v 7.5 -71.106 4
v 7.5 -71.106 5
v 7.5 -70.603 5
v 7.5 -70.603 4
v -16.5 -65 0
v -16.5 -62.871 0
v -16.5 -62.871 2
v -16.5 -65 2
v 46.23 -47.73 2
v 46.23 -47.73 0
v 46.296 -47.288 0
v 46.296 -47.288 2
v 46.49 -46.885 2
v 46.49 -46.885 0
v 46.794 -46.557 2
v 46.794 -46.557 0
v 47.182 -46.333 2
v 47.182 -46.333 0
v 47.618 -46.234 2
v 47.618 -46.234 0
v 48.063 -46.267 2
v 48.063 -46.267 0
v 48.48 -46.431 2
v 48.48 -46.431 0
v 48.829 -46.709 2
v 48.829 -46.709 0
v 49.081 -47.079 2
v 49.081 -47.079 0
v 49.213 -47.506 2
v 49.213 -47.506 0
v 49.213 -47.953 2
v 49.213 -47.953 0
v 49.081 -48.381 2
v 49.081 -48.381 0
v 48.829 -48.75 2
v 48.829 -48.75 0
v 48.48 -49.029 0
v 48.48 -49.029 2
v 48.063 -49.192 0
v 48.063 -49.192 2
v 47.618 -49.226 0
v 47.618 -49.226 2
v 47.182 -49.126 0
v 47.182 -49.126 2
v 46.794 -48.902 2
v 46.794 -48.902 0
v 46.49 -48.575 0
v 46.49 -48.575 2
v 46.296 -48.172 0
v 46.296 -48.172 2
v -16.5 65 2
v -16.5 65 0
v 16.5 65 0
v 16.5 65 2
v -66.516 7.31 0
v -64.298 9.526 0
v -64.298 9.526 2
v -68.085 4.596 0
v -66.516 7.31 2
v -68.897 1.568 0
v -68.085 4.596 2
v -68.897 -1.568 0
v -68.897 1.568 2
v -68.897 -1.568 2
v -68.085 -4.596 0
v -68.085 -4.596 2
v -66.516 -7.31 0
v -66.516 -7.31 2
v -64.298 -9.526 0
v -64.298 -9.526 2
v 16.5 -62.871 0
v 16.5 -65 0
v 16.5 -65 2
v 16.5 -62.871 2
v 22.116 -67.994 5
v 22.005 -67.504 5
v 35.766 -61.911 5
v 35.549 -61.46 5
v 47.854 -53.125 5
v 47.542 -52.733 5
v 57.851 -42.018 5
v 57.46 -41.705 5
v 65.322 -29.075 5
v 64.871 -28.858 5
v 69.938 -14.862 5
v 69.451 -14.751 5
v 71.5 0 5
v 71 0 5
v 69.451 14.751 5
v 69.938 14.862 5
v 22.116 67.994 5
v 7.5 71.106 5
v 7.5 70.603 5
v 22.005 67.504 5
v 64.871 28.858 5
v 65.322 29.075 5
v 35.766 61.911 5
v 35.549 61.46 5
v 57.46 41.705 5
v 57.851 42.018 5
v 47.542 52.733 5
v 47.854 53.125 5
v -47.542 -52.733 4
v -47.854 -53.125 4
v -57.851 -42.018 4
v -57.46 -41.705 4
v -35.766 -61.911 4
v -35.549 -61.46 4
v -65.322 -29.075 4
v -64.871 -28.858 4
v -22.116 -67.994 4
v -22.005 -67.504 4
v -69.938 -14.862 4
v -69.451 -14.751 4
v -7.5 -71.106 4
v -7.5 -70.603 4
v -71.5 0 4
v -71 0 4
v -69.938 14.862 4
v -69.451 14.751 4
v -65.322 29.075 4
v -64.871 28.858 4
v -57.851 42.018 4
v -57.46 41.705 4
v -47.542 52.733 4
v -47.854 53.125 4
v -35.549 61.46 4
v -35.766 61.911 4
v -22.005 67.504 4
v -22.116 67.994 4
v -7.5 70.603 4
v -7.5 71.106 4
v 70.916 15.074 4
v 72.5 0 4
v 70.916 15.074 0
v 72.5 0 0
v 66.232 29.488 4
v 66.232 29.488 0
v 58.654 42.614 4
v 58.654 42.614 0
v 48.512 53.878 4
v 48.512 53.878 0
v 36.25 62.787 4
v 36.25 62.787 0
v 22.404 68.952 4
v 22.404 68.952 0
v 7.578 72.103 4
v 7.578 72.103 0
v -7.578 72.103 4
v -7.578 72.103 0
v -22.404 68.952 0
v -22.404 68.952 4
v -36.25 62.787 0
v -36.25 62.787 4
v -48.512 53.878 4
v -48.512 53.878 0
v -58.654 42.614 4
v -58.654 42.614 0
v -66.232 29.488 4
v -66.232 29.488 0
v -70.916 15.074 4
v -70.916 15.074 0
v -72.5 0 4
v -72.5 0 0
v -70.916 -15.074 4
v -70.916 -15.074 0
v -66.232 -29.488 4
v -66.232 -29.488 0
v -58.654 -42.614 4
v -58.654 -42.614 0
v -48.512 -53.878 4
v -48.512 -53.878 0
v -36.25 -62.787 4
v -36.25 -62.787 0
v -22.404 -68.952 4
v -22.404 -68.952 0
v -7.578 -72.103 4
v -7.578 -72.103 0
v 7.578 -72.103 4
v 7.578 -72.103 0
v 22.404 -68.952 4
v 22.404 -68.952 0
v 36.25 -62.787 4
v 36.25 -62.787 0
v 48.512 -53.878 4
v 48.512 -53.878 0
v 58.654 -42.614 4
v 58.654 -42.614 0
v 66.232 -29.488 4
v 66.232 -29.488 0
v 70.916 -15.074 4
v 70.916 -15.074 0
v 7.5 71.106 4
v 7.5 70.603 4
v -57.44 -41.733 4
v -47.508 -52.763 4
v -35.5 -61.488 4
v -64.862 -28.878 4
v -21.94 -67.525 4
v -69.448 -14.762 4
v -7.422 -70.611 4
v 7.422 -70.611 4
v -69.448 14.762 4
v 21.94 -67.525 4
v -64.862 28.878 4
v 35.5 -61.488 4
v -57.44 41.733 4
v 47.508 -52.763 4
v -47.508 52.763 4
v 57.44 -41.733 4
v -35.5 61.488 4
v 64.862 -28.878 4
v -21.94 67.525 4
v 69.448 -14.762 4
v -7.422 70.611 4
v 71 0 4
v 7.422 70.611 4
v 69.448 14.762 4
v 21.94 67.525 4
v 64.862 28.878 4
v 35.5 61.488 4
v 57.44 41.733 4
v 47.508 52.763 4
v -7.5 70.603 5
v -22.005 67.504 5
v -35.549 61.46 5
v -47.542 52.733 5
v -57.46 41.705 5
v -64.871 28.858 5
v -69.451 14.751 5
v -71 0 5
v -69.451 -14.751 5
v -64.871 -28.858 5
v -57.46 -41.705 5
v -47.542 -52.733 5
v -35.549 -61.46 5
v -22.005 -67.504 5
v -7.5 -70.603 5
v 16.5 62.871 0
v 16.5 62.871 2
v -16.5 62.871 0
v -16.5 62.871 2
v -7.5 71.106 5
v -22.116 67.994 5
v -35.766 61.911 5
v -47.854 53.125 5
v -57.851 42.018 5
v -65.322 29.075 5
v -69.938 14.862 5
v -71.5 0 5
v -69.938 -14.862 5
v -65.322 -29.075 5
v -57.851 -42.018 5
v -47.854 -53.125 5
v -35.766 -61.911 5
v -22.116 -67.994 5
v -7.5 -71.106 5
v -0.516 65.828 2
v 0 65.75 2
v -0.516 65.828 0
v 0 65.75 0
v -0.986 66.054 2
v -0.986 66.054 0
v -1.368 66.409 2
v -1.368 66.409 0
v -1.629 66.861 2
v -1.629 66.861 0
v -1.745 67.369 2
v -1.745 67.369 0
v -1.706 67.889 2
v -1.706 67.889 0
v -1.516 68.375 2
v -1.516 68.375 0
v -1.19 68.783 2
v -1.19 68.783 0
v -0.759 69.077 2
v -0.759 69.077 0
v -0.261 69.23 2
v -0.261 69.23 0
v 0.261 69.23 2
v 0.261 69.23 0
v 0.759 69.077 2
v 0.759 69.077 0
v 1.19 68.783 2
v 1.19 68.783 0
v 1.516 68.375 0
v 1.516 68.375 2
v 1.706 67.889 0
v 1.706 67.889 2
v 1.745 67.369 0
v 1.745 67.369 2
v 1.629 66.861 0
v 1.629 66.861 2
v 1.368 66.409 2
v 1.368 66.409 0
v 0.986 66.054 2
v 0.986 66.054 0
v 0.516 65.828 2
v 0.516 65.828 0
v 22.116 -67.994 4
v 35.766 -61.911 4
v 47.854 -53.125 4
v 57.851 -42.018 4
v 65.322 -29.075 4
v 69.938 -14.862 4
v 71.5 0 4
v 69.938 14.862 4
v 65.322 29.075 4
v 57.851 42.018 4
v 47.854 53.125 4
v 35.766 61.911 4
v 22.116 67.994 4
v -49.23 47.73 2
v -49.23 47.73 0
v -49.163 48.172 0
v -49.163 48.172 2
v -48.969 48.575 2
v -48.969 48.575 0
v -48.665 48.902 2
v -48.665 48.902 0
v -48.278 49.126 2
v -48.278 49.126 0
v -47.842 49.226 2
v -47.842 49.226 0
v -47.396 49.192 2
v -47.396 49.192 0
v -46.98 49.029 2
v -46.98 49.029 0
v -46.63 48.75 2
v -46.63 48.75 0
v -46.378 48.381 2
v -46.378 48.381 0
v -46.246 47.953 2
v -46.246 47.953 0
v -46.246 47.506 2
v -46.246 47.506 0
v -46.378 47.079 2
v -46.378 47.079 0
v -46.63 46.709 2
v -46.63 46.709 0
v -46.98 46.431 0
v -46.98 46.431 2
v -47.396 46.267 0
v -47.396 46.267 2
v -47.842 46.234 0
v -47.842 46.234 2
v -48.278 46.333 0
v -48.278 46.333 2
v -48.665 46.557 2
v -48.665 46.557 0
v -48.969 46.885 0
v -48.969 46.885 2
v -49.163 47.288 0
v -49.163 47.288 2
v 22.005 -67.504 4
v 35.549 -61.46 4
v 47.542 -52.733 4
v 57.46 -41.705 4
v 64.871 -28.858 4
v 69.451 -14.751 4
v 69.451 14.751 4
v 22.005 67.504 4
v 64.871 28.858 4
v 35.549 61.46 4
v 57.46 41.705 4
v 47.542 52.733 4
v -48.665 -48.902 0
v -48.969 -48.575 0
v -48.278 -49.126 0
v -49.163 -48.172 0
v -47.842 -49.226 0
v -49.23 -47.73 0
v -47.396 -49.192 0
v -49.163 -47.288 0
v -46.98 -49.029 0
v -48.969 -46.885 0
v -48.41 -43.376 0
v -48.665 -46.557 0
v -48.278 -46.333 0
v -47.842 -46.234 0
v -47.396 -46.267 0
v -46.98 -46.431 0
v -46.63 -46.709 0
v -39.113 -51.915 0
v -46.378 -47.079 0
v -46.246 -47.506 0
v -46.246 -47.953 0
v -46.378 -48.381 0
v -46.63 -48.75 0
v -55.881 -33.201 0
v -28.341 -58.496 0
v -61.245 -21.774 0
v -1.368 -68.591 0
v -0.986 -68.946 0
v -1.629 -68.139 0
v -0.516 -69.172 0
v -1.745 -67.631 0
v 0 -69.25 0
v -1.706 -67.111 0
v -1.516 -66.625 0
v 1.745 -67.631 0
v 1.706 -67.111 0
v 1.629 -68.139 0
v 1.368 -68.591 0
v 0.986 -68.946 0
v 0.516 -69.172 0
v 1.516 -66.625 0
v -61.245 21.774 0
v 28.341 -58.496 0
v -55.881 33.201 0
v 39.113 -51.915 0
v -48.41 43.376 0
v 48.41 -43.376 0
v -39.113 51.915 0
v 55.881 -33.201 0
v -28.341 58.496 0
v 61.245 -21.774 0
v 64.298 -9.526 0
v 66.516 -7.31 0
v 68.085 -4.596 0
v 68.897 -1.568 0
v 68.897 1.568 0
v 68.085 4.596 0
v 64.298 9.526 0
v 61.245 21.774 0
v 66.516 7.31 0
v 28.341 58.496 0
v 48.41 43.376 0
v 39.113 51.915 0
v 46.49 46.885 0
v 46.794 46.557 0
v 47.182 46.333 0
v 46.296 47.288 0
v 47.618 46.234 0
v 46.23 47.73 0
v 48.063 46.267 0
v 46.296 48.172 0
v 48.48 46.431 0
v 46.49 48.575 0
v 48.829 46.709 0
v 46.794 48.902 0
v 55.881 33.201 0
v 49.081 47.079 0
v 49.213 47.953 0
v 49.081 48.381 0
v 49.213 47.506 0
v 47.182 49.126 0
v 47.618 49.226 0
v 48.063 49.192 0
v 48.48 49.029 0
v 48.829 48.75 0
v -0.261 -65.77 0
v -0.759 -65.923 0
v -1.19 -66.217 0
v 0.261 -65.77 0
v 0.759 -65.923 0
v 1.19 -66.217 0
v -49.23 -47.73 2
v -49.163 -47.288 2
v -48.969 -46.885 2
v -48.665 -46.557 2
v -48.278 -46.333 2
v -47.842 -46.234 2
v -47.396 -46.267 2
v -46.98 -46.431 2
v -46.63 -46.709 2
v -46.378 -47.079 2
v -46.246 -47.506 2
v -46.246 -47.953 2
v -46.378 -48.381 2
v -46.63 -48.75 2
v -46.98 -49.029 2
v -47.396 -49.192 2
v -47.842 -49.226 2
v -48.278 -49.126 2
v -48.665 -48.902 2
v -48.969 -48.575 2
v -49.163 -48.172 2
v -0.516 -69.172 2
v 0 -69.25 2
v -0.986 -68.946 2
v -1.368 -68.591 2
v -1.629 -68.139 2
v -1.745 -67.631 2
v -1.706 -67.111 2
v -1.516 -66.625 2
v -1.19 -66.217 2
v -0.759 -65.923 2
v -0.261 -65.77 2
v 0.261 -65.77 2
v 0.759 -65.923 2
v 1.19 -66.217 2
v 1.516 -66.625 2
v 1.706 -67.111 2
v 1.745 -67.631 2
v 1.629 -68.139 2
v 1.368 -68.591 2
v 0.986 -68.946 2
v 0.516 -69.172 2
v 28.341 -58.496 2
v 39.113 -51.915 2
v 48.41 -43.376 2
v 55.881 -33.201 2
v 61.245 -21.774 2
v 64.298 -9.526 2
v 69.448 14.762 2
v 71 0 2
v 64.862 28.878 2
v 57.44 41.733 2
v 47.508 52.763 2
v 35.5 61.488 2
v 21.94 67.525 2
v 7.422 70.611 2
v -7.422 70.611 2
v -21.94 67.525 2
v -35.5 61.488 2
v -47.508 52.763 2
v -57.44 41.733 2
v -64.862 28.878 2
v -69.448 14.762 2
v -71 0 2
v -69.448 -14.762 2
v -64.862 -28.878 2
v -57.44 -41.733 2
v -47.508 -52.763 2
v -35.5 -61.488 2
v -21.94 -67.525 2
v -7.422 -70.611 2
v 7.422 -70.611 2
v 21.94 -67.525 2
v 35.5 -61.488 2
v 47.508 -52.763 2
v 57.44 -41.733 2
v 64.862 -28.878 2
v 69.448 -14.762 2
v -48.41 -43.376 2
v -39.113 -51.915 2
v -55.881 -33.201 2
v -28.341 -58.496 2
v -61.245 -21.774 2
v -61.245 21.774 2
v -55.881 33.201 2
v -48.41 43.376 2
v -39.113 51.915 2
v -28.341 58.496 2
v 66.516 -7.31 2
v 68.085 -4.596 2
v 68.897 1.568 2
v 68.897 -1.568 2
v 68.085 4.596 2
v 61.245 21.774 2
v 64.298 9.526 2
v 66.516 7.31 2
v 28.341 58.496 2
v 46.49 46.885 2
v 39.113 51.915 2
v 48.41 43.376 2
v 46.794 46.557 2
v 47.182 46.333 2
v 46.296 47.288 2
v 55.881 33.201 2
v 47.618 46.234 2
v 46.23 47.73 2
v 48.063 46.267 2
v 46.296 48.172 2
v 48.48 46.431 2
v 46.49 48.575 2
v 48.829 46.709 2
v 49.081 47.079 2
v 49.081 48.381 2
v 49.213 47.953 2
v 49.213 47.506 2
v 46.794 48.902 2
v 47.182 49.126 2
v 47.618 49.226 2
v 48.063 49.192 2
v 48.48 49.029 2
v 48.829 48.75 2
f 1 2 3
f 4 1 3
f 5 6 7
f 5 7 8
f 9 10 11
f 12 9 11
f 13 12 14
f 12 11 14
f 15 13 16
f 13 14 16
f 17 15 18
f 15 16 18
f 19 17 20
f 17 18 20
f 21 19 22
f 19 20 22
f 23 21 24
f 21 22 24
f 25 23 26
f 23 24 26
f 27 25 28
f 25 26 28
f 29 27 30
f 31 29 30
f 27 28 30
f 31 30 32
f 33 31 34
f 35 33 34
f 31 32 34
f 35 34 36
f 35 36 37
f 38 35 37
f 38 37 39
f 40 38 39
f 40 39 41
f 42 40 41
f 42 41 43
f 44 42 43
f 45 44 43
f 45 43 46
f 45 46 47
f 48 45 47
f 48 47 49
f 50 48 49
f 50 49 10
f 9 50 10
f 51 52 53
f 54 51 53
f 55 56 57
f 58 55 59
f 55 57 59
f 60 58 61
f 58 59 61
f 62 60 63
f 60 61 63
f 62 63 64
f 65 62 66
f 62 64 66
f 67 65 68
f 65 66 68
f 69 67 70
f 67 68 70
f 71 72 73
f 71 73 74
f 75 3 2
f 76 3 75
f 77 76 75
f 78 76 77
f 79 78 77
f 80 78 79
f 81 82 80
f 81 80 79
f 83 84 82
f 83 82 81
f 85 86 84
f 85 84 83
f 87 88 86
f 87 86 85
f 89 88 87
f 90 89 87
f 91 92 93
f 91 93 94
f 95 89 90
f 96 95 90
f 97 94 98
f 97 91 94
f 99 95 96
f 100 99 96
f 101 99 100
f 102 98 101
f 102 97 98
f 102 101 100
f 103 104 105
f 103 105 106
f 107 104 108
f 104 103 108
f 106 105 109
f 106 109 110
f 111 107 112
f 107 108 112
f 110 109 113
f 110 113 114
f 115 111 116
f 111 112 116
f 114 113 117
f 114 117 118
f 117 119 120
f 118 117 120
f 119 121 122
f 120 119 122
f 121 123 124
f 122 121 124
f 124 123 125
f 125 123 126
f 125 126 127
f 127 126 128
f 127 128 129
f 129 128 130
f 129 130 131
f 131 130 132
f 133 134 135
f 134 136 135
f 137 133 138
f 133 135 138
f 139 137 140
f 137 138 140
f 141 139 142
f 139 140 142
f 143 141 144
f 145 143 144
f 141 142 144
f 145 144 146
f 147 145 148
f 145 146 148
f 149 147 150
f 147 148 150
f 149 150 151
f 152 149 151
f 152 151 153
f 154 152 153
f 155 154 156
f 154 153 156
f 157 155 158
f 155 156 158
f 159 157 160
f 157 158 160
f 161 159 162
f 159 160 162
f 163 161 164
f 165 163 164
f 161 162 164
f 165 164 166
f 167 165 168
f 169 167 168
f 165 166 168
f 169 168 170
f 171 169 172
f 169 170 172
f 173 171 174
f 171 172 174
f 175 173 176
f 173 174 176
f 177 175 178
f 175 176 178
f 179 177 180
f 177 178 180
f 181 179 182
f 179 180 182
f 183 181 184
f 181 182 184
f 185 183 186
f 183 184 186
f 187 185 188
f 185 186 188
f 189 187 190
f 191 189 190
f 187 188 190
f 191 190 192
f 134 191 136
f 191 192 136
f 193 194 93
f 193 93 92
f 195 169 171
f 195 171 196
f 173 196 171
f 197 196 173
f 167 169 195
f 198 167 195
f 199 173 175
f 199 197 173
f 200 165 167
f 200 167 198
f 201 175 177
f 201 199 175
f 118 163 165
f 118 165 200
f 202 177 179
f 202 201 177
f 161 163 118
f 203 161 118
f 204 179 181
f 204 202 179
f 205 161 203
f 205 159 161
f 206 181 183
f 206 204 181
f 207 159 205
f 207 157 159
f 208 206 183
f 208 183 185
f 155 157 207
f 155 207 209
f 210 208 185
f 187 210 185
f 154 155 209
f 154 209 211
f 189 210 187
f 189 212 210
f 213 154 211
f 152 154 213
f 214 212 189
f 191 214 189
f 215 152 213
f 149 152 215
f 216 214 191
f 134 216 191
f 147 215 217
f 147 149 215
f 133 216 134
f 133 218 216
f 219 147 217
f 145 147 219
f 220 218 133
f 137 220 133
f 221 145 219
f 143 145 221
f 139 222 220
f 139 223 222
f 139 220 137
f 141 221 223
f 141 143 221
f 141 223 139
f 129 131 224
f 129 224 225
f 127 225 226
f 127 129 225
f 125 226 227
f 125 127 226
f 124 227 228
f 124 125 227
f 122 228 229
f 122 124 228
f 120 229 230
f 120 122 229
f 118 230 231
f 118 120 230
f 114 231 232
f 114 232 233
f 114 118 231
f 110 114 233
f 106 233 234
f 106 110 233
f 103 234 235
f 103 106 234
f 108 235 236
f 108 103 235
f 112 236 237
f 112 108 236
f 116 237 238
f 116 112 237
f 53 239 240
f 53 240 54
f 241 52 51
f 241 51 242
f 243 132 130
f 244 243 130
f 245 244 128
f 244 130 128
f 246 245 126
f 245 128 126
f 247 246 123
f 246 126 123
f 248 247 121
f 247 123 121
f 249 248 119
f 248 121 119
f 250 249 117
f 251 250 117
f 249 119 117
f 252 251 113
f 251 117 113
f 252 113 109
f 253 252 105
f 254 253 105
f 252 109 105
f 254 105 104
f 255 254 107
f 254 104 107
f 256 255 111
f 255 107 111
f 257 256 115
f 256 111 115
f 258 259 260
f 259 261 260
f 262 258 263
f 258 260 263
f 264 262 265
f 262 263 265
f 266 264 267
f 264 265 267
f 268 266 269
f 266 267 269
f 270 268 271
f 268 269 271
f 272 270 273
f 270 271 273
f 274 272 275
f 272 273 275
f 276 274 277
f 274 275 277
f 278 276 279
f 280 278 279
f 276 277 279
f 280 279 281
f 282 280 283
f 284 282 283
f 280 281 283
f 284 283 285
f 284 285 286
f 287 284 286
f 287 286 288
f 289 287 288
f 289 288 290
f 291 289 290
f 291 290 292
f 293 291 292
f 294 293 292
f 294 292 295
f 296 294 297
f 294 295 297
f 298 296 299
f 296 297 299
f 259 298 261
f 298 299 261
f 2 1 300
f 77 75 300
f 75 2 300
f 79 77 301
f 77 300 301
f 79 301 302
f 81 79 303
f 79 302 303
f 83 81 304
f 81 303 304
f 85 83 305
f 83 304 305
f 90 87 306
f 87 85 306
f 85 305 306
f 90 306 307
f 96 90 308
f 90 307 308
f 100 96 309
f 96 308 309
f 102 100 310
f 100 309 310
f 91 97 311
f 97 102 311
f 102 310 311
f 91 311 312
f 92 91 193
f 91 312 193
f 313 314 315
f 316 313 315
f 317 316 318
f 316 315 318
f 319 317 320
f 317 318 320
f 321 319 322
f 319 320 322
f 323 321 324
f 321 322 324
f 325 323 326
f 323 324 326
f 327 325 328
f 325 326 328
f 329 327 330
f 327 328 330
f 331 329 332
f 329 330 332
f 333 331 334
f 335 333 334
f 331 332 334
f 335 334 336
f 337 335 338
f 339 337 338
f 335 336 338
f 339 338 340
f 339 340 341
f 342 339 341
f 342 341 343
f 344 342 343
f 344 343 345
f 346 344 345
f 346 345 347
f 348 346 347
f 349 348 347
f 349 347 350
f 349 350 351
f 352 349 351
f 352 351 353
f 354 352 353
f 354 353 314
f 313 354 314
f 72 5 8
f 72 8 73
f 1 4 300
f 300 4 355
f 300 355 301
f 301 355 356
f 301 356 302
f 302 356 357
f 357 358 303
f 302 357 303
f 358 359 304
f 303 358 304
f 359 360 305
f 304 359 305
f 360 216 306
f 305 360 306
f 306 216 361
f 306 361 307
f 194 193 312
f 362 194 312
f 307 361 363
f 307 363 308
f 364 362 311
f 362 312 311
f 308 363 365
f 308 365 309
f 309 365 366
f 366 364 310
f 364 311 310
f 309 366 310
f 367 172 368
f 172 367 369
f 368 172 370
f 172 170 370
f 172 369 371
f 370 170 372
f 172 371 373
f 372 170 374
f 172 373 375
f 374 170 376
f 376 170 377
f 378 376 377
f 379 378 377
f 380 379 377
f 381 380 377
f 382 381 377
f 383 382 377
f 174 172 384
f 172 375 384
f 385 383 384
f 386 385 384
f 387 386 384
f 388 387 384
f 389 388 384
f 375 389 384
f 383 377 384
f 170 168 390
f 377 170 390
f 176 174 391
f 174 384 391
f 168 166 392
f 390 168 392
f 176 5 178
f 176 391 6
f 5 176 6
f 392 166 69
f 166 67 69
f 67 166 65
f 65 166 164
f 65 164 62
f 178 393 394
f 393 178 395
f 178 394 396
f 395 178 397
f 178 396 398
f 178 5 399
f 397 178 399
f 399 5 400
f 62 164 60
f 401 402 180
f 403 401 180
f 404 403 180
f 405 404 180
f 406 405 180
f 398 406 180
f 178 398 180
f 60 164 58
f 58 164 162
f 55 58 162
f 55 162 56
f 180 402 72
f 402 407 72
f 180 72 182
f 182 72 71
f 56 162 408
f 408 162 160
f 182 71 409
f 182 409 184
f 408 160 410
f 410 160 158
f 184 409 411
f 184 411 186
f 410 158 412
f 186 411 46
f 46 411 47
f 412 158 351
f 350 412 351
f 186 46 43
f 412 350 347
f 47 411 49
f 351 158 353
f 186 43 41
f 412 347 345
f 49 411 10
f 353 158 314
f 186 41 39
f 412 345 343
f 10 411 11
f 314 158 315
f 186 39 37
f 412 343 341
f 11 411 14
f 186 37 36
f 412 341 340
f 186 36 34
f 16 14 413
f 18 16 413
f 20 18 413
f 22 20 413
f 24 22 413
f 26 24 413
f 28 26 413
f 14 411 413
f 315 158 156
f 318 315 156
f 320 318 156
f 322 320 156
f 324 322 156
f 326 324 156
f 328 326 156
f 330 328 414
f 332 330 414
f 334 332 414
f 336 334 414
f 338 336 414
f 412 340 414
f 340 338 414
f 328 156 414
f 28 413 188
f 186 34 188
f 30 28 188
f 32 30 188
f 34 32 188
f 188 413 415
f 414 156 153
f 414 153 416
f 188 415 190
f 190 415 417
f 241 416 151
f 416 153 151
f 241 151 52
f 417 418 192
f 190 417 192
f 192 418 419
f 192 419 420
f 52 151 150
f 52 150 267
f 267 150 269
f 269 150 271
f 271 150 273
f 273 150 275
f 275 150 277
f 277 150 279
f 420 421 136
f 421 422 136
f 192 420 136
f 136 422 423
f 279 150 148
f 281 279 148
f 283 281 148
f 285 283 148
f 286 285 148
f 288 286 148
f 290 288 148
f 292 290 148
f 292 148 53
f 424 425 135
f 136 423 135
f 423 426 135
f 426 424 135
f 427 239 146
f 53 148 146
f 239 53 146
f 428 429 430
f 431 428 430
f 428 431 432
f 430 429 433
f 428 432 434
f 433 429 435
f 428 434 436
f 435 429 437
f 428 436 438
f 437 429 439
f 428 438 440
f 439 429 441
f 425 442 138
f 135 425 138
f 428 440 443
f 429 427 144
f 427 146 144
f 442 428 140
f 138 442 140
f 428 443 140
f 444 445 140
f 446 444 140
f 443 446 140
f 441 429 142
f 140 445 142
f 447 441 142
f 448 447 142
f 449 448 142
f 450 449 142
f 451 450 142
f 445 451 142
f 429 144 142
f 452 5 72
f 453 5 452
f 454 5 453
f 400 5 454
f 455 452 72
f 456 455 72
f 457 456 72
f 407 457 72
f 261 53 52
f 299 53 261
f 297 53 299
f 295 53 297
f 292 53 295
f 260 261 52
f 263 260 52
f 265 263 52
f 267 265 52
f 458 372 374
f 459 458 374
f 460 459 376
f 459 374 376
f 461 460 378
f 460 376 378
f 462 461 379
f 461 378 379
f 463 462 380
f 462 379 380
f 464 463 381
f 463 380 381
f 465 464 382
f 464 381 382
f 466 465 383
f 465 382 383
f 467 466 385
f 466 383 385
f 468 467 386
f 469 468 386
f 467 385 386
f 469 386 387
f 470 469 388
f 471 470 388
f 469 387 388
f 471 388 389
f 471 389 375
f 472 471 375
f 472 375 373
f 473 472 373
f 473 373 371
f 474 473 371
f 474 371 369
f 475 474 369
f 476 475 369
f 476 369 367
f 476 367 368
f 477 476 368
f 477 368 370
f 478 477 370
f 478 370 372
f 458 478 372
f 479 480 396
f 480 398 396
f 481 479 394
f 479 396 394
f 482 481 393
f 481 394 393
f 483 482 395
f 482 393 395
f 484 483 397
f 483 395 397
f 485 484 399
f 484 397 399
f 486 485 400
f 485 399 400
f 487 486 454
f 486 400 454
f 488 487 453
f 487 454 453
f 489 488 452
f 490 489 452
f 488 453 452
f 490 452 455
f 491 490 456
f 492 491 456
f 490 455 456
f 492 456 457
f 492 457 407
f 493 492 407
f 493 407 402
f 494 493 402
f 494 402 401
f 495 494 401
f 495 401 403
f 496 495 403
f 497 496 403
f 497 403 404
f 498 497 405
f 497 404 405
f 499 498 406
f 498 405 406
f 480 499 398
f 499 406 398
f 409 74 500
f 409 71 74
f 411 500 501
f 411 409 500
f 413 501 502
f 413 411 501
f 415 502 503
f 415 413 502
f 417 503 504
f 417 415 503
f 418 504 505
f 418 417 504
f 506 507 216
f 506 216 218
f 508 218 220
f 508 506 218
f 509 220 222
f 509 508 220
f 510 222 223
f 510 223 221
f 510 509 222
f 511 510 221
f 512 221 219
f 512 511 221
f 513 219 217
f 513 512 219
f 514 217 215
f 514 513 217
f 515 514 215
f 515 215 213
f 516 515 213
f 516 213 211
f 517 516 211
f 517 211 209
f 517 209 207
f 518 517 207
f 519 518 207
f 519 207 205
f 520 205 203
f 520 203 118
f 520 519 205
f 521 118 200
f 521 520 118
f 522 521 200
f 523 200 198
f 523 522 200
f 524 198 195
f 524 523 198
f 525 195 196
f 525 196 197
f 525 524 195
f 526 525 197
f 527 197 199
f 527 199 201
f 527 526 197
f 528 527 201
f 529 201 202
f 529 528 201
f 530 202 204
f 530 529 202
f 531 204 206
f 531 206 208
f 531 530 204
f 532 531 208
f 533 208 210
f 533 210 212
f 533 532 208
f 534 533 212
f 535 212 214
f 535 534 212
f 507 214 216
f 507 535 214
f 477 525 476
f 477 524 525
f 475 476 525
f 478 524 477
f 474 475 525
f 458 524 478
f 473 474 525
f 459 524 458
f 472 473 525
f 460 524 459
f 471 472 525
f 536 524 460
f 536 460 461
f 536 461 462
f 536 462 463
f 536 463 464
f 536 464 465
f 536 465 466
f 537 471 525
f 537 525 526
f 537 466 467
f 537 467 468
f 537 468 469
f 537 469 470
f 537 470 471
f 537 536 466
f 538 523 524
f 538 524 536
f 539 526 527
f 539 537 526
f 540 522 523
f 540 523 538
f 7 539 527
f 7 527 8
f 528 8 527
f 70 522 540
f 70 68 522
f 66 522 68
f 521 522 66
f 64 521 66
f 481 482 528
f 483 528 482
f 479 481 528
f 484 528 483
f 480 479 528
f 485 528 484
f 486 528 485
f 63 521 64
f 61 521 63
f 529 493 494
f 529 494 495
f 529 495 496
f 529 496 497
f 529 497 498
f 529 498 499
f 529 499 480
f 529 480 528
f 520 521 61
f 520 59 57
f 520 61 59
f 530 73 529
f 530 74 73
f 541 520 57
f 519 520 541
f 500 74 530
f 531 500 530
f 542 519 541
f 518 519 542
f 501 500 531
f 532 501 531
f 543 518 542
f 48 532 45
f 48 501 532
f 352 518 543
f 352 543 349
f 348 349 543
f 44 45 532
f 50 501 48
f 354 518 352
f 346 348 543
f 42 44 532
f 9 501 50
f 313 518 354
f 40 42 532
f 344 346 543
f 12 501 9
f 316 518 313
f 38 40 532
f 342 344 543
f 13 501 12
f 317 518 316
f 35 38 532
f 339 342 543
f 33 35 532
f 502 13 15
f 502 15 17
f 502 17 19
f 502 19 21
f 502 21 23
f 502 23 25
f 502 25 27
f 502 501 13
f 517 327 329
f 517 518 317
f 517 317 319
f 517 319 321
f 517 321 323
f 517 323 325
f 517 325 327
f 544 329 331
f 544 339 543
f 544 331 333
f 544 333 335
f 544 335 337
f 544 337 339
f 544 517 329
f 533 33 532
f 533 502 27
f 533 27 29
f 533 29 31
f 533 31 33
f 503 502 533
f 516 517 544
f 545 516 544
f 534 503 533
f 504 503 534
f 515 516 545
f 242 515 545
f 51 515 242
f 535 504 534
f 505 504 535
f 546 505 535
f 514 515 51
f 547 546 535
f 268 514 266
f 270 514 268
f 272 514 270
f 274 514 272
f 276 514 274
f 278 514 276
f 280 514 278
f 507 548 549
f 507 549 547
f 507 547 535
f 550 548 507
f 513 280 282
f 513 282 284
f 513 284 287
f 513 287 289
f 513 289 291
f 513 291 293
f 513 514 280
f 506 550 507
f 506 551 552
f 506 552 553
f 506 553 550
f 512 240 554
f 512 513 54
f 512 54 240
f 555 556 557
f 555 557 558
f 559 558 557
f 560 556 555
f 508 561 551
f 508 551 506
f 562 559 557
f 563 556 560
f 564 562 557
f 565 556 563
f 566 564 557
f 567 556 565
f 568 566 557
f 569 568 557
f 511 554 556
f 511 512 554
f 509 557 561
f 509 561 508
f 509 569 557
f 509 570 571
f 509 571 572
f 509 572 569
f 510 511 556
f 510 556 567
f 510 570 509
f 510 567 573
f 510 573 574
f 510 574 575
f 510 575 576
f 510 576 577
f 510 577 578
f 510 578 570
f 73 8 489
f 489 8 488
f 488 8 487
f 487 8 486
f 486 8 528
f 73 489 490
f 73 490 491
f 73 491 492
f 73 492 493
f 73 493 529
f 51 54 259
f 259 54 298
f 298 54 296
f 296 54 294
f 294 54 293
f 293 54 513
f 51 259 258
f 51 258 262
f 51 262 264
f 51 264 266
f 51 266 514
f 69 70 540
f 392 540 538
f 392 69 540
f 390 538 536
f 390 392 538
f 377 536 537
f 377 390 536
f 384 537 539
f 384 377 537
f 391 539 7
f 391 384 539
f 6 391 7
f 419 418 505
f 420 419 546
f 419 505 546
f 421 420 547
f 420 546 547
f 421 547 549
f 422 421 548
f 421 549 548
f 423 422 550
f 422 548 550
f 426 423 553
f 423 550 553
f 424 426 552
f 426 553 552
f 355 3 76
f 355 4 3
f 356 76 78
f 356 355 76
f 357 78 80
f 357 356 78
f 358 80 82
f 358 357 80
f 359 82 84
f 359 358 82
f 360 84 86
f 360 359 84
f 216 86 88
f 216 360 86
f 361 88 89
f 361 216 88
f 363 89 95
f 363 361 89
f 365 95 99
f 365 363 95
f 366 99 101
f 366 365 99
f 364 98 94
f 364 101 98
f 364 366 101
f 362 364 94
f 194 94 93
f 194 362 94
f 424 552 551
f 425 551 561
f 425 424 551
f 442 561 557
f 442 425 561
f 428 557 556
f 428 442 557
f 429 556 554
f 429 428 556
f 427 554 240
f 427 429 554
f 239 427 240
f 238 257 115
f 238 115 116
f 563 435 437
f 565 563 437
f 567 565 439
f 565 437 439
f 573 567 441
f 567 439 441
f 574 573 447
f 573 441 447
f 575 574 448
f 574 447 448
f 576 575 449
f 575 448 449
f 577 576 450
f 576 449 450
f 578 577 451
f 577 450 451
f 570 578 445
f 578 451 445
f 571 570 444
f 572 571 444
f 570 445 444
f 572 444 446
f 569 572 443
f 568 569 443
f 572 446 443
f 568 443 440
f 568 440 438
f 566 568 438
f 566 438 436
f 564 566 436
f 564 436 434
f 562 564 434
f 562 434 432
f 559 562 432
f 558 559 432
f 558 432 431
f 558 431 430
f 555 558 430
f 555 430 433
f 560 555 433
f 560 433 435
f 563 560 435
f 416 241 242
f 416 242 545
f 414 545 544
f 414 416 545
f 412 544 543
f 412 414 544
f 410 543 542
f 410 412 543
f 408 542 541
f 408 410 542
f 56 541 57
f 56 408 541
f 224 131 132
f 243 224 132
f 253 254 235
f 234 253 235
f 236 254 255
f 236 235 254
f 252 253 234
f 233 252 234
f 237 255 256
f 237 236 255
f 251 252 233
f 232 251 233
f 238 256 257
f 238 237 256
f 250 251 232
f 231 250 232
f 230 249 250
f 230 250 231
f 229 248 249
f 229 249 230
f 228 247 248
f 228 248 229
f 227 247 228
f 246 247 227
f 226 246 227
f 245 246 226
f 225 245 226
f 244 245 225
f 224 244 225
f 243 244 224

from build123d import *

# Parameters (mm, degrees)
SKIZZE4_R               = 72.5
SKIZZE4_R_2             = 65
BASE_RING_DEPTH         = 2
SPACER_PLACEMENT_D      = 3
SKIZZE8_R               = 12
BALL_CASTOR_DEPTH       = 103.549987811
SKIZZE9_W               = 33
SKIZZE9_H               = 130
SKIZZE9_H_2             = 100
WHEELS_DEPTH            = 103.549987811
SKIZZE11_R              = 72.5
SKIZZE11_R_2            = 71
SIDE_WALL_DEPTH         = 2
SKIZZE14_R              = 71.5
SKIZZE14_R_2            = 71
INNER_WALL_DEPTH        = 1
SKIZZE13_W              = 1.75
SKIZZE13_H              = 2
COVER_SCREWS_AT_2_COUNT = 2
COVER_SCREWS_AT_2_PITCH = 135
SKIZZE15_W              = 15
SKIZZE15_H              = 145
COVER_OPENING_DEPTH     = 1


with BuildPart() as part:
    # Skizze4 → Base Ring (new body)
    with BuildSketch(Plane.XY):
        Circle(SKIZZE4_R)
        Circle(SKIZZE4_R_2, mode=Mode.SUBTRACT)
    extrude(amount=BASE_RING_DEPTH)

    # Spacer Placement (through all)
    with Locations(Plane.XY.offset(2)):
        with Locations((-47.72970773, 47.72970773), (47.72970773, 47.72970773), (47.72970773, -47.72970773), (-47.72970773, -47.72970773)):
            Hole(SPACER_PLACEMENT_D / 2)

    # Skizze8 → Ball Castor (cut, through all)
    with BuildSketch(Plane.XY.offset(2)):
        with Locations((57, 0)):
            Circle(SKIZZE8_R)
        with Locations((-57, 0)):
            Circle(SKIZZE8_R)
    extrude(amount=-BALL_CASTOR_DEPTH, mode=Mode.SUBTRACT)

    # Skizze9 → Wheels (cut, through all)
    with BuildSketch(Plane.XY):
        Rectangle(SKIZZE9_W, SKIZZE9_H)
        Rectangle(SKIZZE9_W, SKIZZE9_H_2)
    extrude(amount=WHEELS_DEPTH, mode=Mode.SUBTRACT)

    # Skizze11 → Side Wall (add)
    with BuildSketch(Plane.XY.offset(2)):
        Circle(SKIZZE11_R)
        Circle(SKIZZE11_R_2, mode=Mode.SUBTRACT)
    extrude(amount=SIDE_WALL_DEPTH)

    # Skizze13 → Cover Screws (revolve, cut)
    with BuildSketch(Plane(origin=(0, -67.5, 2), x_dir=(0, -1, 0), z_dir=(1, 0, 0))):
        with Locations((0.875, 1)):
            Rectangle(SKIZZE13_W, SKIZZE13_H)
    cover_screws = revolve(axis=Axis((0, -67.5, 8.35), (0, 0, -1)), mode=Mode.SUBTRACT)

    # Cover Screws at 2: Cover Screws ×2
    with Locations(*[(0, i * COVER_SCREWS_AT_2_PITCH, 0) for i in range(1, COVER_SCREWS_AT_2_COUNT)]):
        add(cover_screws, mode=Mode.SUBTRACT)


with BuildPart() as body_2:
    # Skizze14 → Inner Wall (new body)
    with BuildSketch(Plane.XY.offset(4)):
        Circle(SKIZZE14_R)
        Circle(SKIZZE14_R_2, mode=Mode.SUBTRACT)
    extrude(amount=INNER_WALL_DEPTH)

    # Skizze15 → Cover Opening (cut)
    with BuildSketch(Plane.XY.offset(5)):
        Rectangle(SKIZZE15_W, SKIZZE15_H)
    extrude(amount=-COVER_OPENING_DEPTH, mode=Mode.SUBTRACT)


with BuildPart() as cover_opening_piece_1:
    # of the separate pieces the step leaves, piece 1, a body of its own (cover_opening_pieces)
    add(body_2.part.solids().sort_by_distance((7.5, -71.105555339, 4))[0])


with BuildPart() as cover_opening_piece_2:
    # of the separate pieces the step leaves, piece 2, a body of its own (cover_opening_pieces)
    add(body_2.part.solids().sort_by_distance((-7.5, 71.105555339, 4))[0])


solid = Compound([part.part, cover_opening_piece_1.part, cover_opening_piece_2.part])
